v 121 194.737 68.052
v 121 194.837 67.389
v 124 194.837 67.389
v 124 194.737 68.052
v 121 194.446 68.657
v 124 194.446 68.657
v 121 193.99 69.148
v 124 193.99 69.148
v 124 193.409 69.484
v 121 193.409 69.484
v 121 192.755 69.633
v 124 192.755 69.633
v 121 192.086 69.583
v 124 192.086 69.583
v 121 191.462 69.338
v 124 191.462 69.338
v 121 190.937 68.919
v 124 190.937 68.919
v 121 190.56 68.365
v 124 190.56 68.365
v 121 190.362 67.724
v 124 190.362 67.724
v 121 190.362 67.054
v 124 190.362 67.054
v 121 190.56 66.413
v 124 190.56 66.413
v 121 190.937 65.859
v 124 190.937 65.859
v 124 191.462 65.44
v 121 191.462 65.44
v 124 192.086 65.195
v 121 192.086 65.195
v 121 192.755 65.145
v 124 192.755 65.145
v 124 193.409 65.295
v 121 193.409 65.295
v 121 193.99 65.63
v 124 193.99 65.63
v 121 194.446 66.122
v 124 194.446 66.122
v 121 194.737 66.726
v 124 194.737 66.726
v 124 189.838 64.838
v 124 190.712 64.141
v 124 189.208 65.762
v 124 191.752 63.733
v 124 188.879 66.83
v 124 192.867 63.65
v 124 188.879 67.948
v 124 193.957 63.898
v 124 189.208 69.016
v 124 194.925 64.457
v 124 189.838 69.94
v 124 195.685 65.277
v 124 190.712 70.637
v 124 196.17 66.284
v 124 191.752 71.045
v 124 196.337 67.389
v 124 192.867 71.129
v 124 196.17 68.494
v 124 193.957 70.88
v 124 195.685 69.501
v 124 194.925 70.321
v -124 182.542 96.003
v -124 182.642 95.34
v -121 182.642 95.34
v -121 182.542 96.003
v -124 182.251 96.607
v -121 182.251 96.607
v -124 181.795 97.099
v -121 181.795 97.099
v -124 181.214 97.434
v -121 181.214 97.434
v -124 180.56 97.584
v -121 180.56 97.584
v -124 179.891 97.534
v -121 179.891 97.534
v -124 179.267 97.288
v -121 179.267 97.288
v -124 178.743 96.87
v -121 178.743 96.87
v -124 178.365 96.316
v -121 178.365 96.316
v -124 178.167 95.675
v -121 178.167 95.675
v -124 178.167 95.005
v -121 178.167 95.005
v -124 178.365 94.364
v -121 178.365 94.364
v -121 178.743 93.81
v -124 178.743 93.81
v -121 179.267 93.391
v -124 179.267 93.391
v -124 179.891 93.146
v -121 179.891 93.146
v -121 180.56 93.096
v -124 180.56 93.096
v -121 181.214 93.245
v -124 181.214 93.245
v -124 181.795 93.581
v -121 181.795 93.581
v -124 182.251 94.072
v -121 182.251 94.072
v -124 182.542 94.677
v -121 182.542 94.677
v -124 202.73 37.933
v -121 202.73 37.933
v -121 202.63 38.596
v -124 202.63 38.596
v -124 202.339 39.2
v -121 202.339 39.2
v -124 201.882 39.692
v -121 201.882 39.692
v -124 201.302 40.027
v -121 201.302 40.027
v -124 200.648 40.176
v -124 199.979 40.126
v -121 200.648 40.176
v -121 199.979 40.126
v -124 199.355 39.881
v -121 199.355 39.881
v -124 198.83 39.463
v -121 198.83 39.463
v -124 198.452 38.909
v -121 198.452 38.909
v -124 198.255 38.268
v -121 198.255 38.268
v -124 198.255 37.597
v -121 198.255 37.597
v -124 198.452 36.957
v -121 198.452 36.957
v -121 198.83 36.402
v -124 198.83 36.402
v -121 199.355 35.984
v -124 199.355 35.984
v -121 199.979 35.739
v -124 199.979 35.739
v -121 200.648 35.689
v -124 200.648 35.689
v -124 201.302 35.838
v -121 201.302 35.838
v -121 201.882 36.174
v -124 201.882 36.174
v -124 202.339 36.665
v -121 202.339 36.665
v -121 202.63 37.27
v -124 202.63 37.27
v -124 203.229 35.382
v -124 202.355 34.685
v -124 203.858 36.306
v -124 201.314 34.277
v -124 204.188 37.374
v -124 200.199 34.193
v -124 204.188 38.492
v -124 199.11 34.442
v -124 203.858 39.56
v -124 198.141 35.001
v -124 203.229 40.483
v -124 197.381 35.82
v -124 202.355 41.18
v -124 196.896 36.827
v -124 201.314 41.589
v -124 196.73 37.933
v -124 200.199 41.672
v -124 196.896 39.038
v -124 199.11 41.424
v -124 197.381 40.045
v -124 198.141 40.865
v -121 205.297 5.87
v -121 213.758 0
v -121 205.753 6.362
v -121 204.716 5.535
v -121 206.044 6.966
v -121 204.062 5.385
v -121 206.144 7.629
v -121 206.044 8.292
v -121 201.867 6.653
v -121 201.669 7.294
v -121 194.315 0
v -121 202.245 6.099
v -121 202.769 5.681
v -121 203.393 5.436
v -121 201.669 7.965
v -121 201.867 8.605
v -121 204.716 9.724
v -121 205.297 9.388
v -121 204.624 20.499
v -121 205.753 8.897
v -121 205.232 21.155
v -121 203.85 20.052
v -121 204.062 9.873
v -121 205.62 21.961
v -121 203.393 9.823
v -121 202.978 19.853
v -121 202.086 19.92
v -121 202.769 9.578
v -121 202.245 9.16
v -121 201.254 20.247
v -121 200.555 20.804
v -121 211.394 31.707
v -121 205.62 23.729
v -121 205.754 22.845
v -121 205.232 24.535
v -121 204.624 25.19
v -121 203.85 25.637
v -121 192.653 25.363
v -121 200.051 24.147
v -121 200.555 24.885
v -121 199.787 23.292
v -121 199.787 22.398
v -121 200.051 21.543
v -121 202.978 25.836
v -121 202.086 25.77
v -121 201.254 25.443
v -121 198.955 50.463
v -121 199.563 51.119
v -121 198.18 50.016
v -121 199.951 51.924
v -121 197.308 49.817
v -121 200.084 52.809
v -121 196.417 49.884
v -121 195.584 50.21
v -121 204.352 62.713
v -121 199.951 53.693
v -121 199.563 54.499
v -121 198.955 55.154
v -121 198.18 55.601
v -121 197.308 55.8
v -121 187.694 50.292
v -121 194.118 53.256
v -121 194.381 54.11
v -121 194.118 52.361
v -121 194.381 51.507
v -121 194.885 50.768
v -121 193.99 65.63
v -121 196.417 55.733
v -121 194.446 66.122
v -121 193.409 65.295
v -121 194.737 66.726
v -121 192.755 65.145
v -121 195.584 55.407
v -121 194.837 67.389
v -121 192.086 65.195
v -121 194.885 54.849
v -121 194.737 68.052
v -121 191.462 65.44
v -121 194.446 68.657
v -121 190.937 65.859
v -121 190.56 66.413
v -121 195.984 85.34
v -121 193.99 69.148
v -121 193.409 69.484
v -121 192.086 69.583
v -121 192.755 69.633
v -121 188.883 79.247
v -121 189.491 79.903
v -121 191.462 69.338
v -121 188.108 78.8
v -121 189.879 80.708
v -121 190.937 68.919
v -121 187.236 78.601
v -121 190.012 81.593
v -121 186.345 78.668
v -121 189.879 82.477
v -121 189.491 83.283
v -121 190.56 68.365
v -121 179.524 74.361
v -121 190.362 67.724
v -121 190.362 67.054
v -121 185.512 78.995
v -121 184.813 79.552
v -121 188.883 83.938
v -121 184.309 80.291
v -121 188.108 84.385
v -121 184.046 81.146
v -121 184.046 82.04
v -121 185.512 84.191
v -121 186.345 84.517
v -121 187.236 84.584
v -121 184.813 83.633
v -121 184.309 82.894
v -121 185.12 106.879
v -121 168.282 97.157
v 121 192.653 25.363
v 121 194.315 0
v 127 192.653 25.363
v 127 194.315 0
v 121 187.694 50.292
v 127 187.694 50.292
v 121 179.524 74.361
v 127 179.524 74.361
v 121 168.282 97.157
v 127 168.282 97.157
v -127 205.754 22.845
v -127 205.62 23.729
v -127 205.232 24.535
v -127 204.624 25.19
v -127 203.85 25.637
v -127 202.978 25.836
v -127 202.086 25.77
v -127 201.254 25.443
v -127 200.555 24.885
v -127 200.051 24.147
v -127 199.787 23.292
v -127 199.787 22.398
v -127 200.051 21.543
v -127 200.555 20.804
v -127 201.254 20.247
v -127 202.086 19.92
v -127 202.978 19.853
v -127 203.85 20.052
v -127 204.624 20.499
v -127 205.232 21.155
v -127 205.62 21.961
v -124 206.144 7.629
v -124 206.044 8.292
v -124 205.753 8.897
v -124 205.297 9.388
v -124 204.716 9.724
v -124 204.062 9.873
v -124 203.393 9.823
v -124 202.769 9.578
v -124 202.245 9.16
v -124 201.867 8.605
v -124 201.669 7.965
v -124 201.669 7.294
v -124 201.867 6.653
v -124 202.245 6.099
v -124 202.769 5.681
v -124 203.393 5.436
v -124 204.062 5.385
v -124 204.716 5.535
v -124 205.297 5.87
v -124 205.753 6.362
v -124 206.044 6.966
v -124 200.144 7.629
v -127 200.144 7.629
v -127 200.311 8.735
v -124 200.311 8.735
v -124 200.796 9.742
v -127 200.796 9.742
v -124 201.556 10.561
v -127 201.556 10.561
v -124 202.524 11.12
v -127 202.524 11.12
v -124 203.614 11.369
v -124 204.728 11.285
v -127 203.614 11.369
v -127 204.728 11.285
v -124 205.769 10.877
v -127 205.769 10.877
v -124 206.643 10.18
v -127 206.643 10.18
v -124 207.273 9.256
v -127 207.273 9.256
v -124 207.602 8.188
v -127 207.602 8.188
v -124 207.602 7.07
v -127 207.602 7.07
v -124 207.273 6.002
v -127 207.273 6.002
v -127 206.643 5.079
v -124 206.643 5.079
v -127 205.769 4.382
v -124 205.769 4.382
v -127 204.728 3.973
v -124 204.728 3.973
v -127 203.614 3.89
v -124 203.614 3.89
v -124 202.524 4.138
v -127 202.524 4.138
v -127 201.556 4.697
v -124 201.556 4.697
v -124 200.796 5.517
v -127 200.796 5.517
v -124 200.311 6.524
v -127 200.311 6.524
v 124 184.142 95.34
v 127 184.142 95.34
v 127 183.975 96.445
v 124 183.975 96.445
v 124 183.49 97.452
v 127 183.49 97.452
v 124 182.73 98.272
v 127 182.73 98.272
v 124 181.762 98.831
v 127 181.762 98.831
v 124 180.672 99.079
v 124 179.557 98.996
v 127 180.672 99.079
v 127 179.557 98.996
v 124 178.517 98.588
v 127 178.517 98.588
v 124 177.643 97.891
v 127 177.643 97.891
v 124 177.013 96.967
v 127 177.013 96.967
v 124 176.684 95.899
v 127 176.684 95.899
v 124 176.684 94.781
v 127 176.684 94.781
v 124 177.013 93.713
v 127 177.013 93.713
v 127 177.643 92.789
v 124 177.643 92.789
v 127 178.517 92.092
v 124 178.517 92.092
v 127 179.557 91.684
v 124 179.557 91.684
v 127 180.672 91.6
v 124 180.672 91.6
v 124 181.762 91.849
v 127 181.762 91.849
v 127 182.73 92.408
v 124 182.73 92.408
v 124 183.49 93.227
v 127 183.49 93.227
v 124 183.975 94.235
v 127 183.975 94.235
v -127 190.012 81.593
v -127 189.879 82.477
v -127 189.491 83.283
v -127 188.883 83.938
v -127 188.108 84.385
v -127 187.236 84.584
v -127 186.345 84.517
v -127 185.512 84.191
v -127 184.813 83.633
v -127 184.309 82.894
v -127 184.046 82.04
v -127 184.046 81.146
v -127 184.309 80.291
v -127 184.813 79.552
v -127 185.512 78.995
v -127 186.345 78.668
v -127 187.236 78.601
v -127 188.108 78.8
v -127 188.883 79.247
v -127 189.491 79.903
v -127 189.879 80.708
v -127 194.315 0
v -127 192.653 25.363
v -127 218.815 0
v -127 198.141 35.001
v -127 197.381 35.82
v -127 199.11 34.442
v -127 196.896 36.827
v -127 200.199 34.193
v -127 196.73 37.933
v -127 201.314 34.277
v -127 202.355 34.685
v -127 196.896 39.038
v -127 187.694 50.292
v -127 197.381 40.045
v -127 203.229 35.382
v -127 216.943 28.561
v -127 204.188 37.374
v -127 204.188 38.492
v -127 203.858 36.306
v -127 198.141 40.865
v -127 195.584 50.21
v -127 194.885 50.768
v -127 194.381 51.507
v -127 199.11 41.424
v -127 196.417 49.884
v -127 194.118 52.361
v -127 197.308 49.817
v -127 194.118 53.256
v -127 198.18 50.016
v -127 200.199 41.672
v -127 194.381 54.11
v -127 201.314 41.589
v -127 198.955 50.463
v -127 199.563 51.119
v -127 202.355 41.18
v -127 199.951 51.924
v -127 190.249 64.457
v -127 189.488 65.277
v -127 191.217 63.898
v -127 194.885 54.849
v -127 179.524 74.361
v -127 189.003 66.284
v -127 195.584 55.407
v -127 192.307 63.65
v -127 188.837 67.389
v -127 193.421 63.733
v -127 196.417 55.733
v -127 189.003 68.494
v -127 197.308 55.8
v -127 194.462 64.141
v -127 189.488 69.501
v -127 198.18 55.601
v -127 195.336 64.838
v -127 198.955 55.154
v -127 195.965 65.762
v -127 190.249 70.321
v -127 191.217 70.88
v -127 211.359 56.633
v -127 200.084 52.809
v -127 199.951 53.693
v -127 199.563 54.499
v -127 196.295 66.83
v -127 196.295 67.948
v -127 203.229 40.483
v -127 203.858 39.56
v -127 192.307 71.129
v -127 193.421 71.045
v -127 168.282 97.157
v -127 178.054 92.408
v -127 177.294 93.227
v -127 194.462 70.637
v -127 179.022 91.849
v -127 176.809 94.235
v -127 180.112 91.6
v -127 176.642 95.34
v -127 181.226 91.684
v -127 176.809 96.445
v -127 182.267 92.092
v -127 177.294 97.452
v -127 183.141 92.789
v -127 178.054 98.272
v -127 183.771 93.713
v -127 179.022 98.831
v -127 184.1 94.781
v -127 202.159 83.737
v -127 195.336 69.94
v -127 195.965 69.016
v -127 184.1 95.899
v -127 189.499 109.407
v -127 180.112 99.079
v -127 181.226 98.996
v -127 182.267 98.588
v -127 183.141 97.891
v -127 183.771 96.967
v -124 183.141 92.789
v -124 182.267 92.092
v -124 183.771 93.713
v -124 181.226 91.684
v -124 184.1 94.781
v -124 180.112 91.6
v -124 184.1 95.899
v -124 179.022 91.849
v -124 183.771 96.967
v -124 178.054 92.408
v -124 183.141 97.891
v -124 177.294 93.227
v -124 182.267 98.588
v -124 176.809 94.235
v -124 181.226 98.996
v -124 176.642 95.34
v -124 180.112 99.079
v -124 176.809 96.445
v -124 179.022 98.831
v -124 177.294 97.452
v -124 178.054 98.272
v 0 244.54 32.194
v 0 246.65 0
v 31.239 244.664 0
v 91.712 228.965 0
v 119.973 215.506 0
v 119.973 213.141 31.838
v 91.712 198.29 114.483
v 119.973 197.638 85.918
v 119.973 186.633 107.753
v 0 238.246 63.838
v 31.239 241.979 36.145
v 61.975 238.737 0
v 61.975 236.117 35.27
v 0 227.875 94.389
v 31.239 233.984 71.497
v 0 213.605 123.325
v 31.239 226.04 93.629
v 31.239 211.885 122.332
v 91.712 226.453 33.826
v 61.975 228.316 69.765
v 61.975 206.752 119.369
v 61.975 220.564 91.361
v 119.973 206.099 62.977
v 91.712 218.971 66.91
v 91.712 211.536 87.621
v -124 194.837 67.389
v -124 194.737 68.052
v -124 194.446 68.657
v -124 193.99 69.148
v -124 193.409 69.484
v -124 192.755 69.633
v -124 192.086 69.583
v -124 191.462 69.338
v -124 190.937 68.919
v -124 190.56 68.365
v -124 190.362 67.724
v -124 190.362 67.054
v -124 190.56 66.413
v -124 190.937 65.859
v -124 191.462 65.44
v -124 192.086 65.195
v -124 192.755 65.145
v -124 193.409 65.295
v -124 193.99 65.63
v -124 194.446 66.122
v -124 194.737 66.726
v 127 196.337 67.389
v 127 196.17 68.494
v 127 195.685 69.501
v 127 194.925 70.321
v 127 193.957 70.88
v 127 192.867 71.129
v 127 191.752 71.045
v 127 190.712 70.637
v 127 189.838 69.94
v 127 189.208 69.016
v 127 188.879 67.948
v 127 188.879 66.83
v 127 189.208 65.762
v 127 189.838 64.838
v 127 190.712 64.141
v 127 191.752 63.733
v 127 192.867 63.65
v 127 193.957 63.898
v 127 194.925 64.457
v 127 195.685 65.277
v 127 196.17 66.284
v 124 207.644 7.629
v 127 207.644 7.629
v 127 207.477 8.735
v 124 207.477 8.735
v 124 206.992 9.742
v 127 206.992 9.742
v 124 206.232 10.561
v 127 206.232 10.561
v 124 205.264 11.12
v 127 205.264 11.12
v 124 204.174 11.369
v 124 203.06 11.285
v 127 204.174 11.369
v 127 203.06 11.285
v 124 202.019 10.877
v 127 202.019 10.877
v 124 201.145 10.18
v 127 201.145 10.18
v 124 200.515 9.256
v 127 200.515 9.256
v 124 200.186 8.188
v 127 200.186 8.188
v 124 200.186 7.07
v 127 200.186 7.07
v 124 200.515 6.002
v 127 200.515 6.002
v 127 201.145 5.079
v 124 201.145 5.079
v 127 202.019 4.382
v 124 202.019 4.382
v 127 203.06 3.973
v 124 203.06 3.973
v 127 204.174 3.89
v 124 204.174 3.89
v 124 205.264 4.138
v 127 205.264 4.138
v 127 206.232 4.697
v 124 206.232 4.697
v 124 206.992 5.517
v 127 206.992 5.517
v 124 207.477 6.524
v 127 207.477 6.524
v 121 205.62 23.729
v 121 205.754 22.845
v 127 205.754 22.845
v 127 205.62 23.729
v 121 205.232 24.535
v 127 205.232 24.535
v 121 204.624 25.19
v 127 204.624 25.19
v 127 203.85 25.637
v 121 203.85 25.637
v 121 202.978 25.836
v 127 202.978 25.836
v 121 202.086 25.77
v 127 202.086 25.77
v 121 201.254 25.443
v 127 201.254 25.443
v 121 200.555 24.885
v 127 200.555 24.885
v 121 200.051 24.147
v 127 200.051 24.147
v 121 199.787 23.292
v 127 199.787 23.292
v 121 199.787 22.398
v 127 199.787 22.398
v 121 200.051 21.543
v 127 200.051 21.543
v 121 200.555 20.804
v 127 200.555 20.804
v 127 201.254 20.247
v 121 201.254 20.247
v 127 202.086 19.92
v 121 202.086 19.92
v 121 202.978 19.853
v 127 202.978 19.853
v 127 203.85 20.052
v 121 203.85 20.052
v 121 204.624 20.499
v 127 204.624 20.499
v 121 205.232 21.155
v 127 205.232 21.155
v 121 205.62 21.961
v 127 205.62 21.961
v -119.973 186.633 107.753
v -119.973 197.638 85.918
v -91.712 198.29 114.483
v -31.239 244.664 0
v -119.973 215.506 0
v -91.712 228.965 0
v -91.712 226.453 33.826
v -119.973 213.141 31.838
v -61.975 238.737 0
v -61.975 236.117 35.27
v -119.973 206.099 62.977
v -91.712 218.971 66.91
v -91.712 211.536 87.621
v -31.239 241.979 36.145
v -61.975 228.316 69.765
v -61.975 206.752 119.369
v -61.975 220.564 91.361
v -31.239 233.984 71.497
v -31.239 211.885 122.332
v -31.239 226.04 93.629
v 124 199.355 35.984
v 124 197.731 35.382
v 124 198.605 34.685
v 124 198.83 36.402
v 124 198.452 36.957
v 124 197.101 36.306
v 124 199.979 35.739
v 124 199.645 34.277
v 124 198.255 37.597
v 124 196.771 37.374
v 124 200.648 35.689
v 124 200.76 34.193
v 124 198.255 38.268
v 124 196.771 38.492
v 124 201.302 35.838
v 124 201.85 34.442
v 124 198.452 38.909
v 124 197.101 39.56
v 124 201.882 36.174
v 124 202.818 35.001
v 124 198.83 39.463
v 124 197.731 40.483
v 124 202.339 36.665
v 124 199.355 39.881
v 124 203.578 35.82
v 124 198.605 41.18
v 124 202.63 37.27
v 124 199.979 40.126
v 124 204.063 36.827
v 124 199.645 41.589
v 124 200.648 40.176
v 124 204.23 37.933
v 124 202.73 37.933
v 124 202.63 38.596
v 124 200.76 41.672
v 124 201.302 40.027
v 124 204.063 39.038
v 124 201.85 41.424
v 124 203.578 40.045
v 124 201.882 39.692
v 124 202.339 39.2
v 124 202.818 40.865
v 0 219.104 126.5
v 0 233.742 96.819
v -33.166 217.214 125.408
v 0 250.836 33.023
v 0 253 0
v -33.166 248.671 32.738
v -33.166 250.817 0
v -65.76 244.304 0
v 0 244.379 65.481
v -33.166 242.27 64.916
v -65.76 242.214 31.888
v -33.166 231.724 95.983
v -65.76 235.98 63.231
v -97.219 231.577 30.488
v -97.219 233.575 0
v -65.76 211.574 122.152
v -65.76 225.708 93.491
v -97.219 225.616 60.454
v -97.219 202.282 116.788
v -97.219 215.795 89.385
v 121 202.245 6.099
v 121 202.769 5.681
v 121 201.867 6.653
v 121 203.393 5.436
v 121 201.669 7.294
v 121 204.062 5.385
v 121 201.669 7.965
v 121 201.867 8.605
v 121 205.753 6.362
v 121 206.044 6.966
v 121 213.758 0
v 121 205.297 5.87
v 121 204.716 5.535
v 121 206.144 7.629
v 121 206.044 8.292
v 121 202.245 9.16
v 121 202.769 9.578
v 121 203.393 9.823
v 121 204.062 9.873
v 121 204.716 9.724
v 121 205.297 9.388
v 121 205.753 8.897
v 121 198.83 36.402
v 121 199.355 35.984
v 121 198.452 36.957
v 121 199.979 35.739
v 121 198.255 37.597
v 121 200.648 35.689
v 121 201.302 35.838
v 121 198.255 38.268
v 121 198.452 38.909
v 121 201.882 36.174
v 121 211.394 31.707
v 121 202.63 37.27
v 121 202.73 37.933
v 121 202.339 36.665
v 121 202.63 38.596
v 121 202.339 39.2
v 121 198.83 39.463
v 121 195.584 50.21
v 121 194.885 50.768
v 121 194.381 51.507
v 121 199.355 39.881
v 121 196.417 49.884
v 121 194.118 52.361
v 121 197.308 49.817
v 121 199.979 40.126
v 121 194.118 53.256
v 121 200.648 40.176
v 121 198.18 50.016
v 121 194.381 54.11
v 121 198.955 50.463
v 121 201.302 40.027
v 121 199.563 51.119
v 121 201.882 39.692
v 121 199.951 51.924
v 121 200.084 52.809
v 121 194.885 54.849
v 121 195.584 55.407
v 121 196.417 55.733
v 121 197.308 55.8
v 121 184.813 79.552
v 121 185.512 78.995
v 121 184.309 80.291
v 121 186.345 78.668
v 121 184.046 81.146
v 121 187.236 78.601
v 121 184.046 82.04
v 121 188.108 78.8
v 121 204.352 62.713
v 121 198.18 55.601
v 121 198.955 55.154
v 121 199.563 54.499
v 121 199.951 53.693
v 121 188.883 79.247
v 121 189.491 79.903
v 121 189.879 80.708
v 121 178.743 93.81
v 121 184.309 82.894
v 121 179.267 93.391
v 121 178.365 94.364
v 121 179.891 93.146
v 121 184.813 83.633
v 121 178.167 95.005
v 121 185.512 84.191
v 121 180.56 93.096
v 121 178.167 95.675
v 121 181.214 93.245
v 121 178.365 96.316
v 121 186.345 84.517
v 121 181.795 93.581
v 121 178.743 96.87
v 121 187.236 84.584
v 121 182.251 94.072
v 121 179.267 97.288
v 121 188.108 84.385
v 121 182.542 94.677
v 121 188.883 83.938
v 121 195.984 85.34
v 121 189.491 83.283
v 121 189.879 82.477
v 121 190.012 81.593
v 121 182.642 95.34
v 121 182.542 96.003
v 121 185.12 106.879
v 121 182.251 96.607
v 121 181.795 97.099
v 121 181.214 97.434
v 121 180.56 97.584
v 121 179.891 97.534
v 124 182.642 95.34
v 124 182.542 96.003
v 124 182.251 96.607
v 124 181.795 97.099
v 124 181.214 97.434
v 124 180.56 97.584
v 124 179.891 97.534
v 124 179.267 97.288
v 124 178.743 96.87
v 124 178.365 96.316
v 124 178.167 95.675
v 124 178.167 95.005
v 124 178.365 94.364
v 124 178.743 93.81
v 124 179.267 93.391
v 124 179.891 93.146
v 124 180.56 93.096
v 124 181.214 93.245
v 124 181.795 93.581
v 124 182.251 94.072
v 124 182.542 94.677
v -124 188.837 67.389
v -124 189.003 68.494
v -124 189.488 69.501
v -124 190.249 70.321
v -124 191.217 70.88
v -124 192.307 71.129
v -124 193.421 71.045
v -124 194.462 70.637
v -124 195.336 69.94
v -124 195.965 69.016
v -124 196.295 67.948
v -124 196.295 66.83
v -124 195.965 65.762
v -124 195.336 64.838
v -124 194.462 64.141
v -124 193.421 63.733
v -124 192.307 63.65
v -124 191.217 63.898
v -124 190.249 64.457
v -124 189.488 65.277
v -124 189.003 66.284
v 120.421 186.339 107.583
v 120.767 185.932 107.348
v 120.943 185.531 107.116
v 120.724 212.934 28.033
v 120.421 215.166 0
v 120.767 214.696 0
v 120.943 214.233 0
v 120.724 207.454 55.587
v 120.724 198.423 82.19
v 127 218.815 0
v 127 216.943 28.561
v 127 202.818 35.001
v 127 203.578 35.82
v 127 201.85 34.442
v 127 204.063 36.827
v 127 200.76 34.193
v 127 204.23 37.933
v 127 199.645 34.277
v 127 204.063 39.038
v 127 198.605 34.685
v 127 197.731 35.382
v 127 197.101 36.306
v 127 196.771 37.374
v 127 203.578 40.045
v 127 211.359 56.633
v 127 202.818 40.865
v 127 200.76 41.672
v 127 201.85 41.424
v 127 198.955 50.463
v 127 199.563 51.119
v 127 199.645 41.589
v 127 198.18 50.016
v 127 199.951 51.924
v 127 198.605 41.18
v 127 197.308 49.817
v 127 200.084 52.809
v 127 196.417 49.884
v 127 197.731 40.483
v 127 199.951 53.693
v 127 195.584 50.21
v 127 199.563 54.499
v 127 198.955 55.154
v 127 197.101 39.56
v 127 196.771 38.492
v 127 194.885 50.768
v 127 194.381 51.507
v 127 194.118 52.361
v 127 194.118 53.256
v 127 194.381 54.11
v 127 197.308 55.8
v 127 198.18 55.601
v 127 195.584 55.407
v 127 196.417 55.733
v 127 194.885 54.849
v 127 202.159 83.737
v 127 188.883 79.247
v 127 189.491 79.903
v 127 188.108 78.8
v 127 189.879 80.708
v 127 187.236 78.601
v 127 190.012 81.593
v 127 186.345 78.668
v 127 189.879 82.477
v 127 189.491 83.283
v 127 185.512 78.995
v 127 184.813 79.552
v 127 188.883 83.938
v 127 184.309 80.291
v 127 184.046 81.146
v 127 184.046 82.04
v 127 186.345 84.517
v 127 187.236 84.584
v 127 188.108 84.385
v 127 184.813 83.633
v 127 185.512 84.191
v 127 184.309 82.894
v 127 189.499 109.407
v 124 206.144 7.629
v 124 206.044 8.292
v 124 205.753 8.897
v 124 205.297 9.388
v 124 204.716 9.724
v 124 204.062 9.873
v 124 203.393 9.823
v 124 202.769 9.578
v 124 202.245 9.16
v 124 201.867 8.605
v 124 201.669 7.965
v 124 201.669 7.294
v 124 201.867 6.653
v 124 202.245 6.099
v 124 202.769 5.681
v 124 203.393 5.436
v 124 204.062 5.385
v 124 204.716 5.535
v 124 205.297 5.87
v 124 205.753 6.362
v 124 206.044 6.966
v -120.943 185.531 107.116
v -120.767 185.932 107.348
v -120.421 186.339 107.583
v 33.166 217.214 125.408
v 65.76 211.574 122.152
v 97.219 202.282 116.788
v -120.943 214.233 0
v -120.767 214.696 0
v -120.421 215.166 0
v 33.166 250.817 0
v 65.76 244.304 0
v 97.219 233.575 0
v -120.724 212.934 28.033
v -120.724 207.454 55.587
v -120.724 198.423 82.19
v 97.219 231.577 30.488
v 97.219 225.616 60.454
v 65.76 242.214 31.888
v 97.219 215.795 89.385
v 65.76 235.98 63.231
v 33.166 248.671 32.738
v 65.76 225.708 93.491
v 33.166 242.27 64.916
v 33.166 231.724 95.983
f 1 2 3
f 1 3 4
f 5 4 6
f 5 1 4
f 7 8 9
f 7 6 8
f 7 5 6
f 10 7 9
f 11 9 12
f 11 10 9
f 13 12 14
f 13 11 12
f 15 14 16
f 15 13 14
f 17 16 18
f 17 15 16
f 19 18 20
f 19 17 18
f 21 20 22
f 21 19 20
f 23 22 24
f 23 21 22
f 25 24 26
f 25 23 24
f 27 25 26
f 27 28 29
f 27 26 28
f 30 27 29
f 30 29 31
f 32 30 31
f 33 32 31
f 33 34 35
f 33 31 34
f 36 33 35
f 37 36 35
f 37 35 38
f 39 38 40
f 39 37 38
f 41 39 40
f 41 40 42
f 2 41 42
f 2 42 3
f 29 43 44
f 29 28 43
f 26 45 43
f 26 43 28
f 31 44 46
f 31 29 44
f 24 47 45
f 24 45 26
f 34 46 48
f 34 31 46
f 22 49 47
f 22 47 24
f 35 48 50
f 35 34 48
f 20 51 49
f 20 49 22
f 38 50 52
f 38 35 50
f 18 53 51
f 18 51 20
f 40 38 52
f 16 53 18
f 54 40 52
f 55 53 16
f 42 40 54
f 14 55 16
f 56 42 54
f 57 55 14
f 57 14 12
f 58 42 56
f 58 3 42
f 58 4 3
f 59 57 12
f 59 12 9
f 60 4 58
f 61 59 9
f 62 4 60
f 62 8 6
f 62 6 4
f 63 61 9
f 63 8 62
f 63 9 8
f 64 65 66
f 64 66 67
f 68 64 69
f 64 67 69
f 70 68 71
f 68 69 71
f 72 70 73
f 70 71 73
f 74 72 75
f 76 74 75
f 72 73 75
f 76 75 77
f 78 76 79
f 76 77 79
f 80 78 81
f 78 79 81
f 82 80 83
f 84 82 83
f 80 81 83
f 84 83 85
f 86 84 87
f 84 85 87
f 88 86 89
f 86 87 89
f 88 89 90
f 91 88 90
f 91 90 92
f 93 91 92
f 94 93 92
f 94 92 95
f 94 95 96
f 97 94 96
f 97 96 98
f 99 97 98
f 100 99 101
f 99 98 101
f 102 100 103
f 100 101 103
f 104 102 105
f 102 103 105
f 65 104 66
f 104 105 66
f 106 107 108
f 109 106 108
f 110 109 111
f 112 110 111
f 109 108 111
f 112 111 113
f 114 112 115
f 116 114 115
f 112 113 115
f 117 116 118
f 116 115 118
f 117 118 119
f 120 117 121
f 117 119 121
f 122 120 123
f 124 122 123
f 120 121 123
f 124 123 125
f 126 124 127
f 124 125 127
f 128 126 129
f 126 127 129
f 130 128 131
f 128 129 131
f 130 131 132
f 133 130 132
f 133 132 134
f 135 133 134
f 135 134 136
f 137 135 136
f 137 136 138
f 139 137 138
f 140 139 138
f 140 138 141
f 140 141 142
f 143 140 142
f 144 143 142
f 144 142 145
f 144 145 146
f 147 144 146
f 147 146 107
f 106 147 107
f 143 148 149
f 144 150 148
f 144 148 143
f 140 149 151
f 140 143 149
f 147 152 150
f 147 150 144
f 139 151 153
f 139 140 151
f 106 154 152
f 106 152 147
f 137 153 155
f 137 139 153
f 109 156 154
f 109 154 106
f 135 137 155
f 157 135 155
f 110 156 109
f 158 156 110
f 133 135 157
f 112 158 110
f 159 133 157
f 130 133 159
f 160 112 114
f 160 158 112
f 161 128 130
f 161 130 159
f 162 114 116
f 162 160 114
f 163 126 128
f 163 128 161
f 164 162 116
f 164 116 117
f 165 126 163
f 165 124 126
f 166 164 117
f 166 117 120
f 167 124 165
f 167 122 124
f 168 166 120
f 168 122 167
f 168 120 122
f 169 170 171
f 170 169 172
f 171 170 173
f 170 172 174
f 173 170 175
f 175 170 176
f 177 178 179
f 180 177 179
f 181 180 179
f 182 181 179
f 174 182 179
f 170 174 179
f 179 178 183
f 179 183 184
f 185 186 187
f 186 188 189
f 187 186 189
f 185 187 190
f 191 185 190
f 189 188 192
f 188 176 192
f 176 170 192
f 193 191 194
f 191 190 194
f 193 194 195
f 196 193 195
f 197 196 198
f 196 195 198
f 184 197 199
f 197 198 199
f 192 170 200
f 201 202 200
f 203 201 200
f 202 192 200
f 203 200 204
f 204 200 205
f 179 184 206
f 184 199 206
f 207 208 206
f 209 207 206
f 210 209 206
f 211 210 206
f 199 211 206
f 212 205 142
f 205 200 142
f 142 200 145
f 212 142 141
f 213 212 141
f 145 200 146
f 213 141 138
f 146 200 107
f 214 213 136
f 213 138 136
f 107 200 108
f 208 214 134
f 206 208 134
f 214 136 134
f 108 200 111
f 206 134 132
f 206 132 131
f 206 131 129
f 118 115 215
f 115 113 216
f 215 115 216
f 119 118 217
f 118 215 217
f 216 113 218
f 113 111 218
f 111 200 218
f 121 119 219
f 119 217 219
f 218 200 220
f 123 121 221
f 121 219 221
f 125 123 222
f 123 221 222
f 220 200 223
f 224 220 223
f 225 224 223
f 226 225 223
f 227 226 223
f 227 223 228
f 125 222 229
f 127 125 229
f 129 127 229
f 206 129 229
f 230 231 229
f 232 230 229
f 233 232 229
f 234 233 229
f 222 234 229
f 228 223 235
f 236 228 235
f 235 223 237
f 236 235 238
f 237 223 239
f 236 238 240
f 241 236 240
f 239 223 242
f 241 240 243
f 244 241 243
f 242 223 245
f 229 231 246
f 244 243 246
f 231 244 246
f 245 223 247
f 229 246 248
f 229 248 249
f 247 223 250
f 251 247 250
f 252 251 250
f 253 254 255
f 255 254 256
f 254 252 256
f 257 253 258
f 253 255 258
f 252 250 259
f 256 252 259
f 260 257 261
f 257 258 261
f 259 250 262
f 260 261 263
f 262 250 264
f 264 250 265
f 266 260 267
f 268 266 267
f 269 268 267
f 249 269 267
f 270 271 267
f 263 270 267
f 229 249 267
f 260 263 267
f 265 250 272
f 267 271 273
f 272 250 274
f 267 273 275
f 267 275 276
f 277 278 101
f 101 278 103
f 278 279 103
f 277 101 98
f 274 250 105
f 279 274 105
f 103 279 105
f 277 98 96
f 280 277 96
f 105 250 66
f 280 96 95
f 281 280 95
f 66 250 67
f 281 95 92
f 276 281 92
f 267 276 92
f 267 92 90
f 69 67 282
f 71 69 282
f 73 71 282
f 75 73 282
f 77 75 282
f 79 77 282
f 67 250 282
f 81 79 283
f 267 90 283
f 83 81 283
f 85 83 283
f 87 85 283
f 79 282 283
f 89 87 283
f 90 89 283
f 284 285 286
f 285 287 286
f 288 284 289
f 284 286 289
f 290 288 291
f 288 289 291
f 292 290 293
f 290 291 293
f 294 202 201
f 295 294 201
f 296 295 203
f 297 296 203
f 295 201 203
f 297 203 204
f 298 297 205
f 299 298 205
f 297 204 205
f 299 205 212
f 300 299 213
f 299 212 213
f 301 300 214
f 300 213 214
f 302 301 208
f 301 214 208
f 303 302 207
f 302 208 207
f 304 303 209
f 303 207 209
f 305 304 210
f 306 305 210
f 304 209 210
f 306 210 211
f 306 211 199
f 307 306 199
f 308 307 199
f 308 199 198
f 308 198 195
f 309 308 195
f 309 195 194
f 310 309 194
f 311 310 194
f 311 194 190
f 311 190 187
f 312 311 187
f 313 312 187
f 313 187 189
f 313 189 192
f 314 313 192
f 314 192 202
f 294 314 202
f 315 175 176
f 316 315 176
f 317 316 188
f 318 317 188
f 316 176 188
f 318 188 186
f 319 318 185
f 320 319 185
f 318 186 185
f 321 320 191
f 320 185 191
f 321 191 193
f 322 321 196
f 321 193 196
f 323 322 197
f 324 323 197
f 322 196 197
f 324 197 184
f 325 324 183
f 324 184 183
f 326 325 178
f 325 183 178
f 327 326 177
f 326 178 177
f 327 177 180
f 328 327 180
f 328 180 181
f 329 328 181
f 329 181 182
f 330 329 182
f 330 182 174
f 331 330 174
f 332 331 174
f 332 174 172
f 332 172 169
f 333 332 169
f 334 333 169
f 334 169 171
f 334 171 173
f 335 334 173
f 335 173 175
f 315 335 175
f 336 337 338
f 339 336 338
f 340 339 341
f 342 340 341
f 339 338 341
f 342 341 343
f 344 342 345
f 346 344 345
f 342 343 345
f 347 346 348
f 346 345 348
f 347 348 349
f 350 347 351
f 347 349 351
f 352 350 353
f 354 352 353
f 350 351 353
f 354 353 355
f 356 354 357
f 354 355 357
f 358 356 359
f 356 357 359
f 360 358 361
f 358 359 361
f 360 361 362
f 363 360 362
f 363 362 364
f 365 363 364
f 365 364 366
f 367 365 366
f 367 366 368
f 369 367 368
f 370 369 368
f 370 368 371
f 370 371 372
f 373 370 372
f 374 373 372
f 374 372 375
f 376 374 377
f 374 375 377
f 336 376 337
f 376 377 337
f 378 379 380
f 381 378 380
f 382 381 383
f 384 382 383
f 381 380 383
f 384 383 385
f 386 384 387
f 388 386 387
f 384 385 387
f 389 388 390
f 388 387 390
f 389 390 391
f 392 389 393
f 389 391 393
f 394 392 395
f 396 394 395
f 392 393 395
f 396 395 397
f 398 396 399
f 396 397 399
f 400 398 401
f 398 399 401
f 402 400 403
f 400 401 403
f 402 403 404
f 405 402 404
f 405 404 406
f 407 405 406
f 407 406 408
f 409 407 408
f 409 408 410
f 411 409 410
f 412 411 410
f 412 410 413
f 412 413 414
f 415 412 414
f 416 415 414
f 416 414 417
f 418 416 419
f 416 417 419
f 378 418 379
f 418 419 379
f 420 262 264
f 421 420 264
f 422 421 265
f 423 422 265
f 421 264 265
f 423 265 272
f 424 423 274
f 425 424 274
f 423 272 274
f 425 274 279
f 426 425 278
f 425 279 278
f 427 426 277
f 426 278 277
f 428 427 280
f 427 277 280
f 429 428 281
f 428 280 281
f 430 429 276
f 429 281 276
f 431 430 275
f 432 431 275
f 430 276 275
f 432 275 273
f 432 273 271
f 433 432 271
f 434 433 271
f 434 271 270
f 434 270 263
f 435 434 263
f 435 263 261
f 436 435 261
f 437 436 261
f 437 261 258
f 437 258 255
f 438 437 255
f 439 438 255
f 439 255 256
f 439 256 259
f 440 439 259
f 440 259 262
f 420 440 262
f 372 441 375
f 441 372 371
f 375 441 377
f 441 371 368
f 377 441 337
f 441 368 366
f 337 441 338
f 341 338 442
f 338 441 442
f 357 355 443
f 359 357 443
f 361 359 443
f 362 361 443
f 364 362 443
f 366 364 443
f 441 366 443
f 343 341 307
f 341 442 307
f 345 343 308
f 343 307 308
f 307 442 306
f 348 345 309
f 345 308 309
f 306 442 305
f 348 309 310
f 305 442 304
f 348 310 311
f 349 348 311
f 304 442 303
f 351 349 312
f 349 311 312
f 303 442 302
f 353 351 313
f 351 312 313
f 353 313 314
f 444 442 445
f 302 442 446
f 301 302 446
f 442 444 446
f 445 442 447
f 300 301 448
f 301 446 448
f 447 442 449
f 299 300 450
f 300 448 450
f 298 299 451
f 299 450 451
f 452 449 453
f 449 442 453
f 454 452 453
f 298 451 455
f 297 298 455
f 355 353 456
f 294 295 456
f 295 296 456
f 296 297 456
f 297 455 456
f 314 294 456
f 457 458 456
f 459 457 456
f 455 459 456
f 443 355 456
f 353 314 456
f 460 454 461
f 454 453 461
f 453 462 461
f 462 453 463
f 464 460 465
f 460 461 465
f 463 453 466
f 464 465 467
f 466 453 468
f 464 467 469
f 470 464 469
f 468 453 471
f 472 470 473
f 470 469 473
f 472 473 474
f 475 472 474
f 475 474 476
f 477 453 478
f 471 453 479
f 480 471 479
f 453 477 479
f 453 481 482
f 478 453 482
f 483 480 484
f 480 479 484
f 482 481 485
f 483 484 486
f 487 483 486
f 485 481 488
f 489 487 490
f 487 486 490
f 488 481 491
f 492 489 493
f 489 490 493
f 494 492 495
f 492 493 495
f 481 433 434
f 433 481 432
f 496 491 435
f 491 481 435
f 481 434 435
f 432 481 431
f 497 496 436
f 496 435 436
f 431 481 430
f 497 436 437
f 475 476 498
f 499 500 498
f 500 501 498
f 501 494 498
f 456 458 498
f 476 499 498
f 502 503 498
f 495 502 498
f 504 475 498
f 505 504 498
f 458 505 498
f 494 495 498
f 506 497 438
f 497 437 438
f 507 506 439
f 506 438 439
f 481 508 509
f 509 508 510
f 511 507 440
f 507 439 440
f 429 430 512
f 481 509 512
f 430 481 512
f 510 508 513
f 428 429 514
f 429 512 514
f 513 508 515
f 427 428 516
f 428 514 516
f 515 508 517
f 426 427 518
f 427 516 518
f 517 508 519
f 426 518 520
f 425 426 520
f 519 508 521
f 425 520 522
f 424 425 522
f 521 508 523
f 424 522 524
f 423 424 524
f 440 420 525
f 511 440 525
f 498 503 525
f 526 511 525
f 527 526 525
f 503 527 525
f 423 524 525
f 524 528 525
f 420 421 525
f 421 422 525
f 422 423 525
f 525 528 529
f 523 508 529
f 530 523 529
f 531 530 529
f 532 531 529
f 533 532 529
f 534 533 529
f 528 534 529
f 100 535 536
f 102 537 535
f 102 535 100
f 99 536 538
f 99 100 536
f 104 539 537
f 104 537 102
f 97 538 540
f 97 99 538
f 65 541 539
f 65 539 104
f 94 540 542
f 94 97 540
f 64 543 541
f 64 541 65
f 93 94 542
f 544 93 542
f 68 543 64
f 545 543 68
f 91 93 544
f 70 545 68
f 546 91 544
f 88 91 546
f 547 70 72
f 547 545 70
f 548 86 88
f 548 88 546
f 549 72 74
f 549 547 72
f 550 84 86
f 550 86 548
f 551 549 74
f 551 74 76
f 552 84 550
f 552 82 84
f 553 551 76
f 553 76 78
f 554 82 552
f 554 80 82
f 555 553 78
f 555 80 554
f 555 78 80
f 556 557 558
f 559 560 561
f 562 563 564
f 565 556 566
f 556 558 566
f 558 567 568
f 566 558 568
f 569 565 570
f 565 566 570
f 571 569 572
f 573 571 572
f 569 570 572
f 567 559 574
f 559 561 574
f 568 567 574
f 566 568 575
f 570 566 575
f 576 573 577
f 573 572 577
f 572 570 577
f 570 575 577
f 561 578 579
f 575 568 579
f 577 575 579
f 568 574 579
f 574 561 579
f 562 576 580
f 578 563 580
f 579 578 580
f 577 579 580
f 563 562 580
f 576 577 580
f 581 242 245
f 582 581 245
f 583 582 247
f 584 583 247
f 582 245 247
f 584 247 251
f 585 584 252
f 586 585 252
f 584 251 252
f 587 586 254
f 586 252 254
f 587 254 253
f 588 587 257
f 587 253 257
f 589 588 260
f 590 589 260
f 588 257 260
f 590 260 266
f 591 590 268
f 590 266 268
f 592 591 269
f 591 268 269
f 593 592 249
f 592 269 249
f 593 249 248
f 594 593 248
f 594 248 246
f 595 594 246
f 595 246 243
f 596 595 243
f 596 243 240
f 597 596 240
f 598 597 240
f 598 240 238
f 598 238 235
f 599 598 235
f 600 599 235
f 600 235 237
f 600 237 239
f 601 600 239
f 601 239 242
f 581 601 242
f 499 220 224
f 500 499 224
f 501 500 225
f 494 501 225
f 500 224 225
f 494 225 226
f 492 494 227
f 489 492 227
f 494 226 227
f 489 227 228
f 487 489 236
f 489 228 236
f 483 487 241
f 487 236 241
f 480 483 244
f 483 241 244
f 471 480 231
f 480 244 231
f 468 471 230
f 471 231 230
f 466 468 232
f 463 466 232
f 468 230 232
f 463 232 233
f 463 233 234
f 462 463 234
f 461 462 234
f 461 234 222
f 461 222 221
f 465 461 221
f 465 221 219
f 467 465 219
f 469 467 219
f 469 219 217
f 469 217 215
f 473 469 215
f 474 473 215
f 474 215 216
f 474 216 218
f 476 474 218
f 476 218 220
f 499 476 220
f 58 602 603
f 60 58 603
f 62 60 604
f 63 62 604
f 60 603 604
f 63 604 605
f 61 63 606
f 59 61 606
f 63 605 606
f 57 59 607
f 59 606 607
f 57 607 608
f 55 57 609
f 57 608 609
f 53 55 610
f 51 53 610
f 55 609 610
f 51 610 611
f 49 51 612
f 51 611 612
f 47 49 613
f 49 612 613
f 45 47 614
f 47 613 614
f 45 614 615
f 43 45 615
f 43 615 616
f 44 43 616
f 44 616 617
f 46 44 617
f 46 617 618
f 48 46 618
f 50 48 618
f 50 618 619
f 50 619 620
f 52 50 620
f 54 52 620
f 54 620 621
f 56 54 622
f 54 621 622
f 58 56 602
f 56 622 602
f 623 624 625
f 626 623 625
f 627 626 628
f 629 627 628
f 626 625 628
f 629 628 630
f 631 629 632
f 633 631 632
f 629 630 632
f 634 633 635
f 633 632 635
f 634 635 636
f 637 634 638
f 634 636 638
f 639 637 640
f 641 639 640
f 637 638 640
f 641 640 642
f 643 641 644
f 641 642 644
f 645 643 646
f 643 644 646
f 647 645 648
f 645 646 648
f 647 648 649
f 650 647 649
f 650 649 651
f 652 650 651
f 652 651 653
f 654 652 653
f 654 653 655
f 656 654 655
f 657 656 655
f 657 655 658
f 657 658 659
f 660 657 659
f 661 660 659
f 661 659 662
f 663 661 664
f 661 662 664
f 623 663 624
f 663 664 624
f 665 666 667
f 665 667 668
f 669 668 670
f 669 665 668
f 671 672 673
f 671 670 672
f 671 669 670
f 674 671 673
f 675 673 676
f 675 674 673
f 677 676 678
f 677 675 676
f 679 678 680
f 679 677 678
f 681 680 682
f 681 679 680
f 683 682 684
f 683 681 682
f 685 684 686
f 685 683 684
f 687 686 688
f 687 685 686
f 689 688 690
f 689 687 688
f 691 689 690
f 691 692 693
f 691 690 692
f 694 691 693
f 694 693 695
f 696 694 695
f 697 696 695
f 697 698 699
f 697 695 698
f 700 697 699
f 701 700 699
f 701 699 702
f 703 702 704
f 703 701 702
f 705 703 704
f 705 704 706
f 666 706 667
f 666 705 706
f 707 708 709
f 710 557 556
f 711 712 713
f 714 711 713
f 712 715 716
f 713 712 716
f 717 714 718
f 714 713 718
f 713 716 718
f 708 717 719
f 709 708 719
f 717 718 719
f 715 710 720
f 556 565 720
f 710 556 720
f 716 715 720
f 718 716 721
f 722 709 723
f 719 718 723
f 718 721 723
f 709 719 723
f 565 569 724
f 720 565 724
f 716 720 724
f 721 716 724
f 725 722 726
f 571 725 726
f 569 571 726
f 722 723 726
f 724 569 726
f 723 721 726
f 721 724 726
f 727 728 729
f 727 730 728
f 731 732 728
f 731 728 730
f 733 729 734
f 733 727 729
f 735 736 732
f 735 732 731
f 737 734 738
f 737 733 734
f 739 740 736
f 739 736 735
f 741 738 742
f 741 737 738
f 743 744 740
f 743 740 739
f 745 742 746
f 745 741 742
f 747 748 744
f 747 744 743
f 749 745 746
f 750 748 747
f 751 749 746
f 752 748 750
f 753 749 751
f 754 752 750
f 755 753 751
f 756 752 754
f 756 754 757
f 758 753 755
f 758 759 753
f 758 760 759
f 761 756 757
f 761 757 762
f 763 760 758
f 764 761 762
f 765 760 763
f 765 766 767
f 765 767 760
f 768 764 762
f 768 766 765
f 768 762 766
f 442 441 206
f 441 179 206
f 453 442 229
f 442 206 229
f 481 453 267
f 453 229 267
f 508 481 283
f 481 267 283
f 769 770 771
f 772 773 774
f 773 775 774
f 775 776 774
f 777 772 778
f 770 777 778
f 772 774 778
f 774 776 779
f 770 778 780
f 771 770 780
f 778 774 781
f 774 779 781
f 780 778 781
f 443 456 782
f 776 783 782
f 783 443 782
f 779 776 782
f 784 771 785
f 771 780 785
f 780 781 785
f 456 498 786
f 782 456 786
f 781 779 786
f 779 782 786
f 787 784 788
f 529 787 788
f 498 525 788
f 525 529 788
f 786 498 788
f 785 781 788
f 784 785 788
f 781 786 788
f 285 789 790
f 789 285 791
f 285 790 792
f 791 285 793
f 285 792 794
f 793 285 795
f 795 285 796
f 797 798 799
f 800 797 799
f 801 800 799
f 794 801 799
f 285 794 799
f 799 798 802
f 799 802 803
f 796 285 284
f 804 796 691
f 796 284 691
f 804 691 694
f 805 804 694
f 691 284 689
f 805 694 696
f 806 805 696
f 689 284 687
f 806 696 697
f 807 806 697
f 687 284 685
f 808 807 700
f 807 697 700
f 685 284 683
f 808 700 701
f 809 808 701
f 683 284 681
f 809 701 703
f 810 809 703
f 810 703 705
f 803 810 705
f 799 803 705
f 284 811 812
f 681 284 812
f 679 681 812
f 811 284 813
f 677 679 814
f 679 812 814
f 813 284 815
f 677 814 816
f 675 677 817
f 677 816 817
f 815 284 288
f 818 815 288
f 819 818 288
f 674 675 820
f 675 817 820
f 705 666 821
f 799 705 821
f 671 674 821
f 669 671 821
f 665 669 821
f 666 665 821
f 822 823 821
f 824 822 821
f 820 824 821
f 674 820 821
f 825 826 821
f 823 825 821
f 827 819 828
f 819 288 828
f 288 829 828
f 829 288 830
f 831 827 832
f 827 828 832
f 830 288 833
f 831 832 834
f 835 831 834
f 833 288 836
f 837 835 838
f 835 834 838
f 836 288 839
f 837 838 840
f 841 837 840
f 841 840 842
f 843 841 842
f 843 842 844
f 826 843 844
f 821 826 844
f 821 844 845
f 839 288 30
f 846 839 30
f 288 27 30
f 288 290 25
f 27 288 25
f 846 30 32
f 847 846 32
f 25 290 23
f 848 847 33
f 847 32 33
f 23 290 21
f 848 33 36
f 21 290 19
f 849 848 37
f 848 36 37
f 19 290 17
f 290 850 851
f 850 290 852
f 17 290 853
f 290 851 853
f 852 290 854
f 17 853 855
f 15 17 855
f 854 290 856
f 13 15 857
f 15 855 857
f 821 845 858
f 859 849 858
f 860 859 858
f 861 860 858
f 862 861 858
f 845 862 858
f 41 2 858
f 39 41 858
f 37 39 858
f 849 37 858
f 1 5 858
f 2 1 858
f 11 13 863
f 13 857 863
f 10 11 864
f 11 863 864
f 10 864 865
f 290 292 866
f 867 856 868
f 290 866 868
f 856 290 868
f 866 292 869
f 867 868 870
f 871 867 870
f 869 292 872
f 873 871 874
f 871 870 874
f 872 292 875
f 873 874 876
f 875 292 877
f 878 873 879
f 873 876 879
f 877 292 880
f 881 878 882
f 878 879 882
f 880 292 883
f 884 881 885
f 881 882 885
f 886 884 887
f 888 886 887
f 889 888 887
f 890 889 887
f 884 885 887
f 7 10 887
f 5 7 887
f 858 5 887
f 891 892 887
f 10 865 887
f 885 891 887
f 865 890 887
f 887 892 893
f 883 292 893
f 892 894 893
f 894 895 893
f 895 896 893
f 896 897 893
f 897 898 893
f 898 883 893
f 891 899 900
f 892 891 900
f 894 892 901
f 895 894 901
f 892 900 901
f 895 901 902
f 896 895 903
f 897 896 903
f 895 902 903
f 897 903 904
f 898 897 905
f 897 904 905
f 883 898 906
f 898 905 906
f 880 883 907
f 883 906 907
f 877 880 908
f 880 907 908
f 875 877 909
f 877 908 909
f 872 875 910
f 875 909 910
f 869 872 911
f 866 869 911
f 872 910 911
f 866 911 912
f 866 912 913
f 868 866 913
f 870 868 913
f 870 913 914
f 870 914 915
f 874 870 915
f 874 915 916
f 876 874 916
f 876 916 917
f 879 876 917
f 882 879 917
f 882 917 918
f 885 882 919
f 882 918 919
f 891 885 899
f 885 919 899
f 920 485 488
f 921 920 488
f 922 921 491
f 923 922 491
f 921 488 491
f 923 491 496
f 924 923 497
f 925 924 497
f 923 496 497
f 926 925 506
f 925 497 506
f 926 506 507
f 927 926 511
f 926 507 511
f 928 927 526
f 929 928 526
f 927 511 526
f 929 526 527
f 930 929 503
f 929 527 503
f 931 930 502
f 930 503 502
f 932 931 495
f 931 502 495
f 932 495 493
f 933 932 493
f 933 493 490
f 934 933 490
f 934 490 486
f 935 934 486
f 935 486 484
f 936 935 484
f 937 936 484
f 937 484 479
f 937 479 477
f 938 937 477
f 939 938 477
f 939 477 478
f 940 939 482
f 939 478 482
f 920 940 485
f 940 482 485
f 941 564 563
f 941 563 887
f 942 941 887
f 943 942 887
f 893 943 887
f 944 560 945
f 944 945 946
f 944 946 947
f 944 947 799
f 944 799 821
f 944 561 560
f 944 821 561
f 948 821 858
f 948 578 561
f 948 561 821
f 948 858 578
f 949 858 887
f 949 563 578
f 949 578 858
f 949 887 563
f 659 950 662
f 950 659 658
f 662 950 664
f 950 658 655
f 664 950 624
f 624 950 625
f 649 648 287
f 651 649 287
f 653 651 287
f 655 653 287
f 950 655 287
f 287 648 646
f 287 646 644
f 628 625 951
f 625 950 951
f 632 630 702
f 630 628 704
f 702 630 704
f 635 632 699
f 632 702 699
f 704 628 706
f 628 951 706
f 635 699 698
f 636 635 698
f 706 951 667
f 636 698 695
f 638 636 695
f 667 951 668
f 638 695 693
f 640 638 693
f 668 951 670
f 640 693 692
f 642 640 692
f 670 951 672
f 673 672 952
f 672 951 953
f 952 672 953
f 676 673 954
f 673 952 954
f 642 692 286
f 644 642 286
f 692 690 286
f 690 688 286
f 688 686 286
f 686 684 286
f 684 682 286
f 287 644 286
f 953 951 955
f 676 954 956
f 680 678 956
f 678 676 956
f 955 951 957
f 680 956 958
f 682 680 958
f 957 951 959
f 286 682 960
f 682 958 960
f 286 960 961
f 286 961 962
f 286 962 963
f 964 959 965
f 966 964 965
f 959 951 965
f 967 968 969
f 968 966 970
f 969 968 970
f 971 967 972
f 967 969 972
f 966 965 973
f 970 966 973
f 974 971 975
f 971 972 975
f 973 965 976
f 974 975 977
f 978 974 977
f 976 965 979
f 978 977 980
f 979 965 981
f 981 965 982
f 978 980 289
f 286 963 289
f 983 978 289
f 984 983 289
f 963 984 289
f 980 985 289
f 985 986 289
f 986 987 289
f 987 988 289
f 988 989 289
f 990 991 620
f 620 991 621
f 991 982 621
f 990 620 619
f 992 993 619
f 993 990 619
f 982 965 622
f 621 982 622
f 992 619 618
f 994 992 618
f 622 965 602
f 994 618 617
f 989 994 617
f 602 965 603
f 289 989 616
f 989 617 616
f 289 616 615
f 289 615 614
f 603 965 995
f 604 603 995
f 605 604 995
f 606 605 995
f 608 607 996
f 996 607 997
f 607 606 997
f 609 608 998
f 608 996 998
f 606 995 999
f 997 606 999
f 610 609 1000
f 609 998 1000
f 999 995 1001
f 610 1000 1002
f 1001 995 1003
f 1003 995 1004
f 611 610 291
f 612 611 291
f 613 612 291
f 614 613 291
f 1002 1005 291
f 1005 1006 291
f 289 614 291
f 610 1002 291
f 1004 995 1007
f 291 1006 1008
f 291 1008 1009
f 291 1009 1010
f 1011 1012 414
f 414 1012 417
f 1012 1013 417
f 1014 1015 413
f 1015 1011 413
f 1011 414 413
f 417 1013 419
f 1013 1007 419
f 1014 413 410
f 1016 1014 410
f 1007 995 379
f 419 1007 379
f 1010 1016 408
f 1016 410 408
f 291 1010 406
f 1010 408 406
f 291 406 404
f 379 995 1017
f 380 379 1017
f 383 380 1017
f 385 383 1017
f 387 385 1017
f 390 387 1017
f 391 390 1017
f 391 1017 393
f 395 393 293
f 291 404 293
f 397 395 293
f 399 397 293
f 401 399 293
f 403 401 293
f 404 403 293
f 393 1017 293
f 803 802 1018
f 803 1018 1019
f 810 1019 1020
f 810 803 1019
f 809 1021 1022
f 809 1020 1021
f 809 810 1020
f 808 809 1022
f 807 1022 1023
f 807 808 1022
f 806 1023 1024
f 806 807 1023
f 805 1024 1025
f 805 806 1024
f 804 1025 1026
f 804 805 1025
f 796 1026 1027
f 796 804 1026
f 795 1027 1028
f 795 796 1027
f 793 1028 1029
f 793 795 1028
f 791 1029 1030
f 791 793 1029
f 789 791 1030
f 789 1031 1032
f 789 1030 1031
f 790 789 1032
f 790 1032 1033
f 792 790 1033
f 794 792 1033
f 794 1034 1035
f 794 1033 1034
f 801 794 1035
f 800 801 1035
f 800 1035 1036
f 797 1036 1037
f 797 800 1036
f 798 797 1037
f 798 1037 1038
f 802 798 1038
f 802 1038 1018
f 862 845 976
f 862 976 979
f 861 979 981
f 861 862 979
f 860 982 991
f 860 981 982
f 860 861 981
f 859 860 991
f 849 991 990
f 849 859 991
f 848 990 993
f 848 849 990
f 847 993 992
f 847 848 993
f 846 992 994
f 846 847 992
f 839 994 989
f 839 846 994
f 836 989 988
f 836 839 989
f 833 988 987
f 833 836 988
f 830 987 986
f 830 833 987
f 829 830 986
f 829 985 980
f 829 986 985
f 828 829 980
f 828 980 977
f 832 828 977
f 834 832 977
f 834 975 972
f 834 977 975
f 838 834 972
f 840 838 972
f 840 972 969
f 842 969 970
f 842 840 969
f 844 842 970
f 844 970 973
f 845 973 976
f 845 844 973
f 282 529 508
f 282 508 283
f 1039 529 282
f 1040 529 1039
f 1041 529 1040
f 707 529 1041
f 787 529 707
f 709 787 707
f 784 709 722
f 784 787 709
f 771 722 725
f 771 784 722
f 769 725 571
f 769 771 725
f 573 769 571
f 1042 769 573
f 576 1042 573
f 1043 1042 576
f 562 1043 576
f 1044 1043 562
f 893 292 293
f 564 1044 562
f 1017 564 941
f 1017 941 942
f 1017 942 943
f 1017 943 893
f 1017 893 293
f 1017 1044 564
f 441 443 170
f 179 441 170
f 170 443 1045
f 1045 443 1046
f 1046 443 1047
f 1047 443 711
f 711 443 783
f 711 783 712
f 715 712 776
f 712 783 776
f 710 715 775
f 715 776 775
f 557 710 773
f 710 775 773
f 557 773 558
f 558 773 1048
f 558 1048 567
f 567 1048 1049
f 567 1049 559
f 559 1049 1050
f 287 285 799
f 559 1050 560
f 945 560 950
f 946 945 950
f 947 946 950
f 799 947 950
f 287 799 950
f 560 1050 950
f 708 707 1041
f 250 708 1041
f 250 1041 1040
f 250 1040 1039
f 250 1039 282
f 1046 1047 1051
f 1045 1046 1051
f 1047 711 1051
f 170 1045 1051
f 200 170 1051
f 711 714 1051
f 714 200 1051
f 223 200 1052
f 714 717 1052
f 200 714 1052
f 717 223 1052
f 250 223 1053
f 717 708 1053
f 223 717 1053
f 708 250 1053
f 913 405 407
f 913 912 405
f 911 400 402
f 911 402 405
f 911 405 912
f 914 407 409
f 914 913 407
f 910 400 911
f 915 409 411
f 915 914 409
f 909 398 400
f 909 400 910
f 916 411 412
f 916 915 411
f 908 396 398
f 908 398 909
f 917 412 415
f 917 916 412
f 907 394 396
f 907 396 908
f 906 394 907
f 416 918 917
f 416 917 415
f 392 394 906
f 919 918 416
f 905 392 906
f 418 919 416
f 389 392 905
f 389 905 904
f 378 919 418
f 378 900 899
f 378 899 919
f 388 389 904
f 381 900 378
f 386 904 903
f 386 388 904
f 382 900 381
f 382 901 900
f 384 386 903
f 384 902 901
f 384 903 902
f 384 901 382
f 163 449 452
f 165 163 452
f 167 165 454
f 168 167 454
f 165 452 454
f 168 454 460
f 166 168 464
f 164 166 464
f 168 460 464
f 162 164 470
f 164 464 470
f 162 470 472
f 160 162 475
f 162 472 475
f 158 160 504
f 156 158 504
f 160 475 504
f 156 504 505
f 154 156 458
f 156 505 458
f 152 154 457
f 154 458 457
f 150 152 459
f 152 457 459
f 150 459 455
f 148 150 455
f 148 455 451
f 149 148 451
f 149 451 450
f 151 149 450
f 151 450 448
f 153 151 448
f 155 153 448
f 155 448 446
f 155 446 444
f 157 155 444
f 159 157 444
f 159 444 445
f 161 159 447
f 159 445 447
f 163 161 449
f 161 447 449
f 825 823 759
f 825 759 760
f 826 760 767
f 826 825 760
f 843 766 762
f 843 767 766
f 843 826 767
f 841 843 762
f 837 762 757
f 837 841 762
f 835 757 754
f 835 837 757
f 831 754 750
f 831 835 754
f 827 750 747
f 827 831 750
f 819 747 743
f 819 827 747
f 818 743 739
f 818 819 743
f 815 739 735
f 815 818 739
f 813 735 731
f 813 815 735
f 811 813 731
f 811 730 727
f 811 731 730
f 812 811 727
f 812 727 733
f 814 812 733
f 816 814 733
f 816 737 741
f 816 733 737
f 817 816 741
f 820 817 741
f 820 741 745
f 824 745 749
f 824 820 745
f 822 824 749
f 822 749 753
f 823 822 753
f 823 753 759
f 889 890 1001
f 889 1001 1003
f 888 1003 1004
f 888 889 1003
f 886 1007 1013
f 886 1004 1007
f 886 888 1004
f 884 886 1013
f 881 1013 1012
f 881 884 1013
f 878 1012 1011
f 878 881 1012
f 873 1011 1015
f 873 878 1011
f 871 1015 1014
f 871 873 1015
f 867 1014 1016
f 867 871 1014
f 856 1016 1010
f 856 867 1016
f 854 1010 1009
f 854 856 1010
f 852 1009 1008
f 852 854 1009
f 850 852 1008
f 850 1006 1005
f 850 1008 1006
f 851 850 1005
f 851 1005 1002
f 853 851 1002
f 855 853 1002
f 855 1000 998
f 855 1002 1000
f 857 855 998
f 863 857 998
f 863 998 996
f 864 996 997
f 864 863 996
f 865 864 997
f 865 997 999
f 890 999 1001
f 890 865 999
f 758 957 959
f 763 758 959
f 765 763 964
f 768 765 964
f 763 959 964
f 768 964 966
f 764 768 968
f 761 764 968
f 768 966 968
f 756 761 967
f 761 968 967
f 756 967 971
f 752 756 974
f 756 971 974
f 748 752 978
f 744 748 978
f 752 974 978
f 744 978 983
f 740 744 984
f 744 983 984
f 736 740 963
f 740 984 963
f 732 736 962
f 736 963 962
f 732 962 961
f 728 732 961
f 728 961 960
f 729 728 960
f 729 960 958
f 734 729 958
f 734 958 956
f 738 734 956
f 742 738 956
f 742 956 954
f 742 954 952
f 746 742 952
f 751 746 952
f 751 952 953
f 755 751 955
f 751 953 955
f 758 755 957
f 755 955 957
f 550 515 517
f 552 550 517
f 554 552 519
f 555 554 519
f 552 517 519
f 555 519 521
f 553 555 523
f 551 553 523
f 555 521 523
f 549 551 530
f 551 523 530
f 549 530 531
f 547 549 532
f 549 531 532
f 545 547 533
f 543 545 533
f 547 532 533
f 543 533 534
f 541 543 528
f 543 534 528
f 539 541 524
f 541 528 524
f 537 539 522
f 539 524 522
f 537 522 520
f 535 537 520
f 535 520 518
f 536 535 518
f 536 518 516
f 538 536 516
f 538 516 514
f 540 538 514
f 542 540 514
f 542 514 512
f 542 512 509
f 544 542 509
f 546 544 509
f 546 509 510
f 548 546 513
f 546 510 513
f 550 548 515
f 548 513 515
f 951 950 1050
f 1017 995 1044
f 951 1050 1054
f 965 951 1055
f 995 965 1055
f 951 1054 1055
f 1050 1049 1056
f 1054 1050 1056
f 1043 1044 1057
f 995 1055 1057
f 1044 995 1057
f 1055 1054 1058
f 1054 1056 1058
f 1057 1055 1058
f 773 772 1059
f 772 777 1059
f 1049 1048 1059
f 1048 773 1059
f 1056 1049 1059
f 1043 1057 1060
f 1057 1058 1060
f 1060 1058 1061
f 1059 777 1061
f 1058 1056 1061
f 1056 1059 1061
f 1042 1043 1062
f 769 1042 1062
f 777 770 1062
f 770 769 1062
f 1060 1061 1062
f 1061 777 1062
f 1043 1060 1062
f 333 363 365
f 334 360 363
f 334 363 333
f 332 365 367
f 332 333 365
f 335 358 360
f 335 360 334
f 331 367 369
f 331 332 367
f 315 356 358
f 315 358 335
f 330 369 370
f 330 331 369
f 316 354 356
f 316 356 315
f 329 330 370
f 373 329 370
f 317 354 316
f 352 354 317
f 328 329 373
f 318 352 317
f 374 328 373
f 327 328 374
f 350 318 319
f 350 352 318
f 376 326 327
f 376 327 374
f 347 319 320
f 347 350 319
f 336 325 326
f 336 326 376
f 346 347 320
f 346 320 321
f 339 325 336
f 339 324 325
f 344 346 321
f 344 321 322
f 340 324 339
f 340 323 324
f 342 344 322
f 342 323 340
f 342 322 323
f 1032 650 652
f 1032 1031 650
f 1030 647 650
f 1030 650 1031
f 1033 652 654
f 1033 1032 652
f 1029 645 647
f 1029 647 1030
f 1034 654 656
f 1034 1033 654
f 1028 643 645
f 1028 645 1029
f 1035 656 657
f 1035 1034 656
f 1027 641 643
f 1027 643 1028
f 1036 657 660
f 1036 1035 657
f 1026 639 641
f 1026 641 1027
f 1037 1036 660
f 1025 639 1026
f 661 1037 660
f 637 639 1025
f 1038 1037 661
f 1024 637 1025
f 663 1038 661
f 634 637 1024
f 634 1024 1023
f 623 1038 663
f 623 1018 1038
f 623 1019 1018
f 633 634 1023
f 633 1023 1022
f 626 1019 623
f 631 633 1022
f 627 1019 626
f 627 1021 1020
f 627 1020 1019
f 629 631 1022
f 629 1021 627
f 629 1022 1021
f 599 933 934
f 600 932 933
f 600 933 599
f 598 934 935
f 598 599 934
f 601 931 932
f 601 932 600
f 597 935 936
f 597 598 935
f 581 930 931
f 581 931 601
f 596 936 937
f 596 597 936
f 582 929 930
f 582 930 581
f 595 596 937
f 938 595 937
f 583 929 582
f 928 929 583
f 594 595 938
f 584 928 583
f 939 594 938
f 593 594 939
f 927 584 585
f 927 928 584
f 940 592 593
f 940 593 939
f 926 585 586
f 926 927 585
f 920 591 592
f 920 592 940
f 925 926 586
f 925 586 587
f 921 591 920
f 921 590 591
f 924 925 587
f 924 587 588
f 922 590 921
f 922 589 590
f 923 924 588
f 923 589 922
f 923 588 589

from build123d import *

# Parameters (mm, degrees)
F1_ANGLE = 30
F2_R     = 2
F3_R     = 2
F4_R     = 2.25
F4_R_2   = 3
F5_DEPTH = 424.191445
F6_R     = 3.75
F7_DEPTH = 3
F8_R     = 3.75
F9_DEPTH = 3


with BuildPart() as f1:
    # F0 (on Top) → F1 (revolve)
    with BuildSketch(Plane.XY):
        with BuildLine():
            Line((127, 194.31499), (127, 218.81499))
            ThreePointArc((127, 218.81499), (65.760199, 244.304311), (0, 253))
            Line((0, 253), (0, 246.65))
            ThreePointArc((0, 246.65), (62.544207, 238.588442), (121, 214.930739))
            Line((121, 214.930739), (121, 194.31499))
            Line((121, 194.31499), (127, 194.31499))
        make_face()
        with BuildLine():
            Line((0, 246.65), (0, 253))
            ThreePointArc((0, 253), (-65.760199, 244.304311), (-127, 218.81499))
            Line((-127, 218.81499), (-127, 194.31499))
            Line((-127, 194.31499), (-121, 194.31499))
            Line((-121, 194.31499), (-121, 214.930739))
            ThreePointArc((-121, 214.930739), (-62.544207, 238.588442), (0, 246.65))
        make_face()
    revolve(axis=Axis((69.665767, 0, 0), (1, 0, 0)), revolution_arc=F1_ANGLE)

    # F2
    f2_edges = [f1.edges().sort_by_distance(p)[0] for p in [
        (121, 207.607152, 55.628169),
    ]]
    fillet(f2_edges, radius=F2_R)

    # F3
    f3_edges = [f1.edges().sort_by_distance(p)[0] for p in [
        (-121, 207.607152, 55.628169),
    ]]
    fillet(f3_edges, radius=F3_R)

    # F4 (on face) → F5 (cut, symmetric)
    with BuildSketch(Plane.YZ.offset(-121)):
        with Locations((203.893977, 7.629174)):
            Circle(F4_R)
        with Locations((202.753719, 22.844858)):
            Circle(F4_R_2)
        with Locations((200.47958, 37.932783)):
            Circle(F4_R)
        with Locations((197.084278, 52.808573)):
            Circle(F4_R_2)
        with Locations((192.586801, 67.389036)):
            Circle(F4_R)
        with Locations((187.0123, 81.592633)):
            Circle(F4_R_2)
        with Locations((180.391951, 95.33993)):
            Circle(F4_R)
    extrude(amount=F5_DEPTH, both=True, mode=Mode.SUBTRACT)

    # F6 (on face) → F7 (cut)
    with BuildSketch(Plane.YZ.offset(127)):
        with Locations((203.893977, 7.629174)):
            Circle(F6_R)
        with Locations((200.47958, 37.932783)):
            Circle(F6_R)
        with Locations((192.586801, 67.389036)):
            Circle(F6_R)
        with Locations((180.391951, 95.33993)):
            Circle(F6_R)
    extrude(amount=-F7_DEPTH, mode=Mode.SUBTRACT)

    # F8 (on face) → F9 (cut)
    with BuildSketch(Plane(origin=(-127, 0, 0), x_dir=(0, -1, 0), z_dir=(-1, 0, 0))):
        with Locations((-203.893977, 7.629174)):
            Circle(F8_R)
        with Locations((-200.47958, 37.932783)):
            Circle(F8_R)
        with Locations((-192.586801, 67.389036)):
            Circle(F8_R)
        with Locations((-180.391951, 95.33993)):
            Circle(F8_R)
    extrude(amount=-F9_DEPTH, mode=Mode.SUBTRACT)


solid = f1.part
